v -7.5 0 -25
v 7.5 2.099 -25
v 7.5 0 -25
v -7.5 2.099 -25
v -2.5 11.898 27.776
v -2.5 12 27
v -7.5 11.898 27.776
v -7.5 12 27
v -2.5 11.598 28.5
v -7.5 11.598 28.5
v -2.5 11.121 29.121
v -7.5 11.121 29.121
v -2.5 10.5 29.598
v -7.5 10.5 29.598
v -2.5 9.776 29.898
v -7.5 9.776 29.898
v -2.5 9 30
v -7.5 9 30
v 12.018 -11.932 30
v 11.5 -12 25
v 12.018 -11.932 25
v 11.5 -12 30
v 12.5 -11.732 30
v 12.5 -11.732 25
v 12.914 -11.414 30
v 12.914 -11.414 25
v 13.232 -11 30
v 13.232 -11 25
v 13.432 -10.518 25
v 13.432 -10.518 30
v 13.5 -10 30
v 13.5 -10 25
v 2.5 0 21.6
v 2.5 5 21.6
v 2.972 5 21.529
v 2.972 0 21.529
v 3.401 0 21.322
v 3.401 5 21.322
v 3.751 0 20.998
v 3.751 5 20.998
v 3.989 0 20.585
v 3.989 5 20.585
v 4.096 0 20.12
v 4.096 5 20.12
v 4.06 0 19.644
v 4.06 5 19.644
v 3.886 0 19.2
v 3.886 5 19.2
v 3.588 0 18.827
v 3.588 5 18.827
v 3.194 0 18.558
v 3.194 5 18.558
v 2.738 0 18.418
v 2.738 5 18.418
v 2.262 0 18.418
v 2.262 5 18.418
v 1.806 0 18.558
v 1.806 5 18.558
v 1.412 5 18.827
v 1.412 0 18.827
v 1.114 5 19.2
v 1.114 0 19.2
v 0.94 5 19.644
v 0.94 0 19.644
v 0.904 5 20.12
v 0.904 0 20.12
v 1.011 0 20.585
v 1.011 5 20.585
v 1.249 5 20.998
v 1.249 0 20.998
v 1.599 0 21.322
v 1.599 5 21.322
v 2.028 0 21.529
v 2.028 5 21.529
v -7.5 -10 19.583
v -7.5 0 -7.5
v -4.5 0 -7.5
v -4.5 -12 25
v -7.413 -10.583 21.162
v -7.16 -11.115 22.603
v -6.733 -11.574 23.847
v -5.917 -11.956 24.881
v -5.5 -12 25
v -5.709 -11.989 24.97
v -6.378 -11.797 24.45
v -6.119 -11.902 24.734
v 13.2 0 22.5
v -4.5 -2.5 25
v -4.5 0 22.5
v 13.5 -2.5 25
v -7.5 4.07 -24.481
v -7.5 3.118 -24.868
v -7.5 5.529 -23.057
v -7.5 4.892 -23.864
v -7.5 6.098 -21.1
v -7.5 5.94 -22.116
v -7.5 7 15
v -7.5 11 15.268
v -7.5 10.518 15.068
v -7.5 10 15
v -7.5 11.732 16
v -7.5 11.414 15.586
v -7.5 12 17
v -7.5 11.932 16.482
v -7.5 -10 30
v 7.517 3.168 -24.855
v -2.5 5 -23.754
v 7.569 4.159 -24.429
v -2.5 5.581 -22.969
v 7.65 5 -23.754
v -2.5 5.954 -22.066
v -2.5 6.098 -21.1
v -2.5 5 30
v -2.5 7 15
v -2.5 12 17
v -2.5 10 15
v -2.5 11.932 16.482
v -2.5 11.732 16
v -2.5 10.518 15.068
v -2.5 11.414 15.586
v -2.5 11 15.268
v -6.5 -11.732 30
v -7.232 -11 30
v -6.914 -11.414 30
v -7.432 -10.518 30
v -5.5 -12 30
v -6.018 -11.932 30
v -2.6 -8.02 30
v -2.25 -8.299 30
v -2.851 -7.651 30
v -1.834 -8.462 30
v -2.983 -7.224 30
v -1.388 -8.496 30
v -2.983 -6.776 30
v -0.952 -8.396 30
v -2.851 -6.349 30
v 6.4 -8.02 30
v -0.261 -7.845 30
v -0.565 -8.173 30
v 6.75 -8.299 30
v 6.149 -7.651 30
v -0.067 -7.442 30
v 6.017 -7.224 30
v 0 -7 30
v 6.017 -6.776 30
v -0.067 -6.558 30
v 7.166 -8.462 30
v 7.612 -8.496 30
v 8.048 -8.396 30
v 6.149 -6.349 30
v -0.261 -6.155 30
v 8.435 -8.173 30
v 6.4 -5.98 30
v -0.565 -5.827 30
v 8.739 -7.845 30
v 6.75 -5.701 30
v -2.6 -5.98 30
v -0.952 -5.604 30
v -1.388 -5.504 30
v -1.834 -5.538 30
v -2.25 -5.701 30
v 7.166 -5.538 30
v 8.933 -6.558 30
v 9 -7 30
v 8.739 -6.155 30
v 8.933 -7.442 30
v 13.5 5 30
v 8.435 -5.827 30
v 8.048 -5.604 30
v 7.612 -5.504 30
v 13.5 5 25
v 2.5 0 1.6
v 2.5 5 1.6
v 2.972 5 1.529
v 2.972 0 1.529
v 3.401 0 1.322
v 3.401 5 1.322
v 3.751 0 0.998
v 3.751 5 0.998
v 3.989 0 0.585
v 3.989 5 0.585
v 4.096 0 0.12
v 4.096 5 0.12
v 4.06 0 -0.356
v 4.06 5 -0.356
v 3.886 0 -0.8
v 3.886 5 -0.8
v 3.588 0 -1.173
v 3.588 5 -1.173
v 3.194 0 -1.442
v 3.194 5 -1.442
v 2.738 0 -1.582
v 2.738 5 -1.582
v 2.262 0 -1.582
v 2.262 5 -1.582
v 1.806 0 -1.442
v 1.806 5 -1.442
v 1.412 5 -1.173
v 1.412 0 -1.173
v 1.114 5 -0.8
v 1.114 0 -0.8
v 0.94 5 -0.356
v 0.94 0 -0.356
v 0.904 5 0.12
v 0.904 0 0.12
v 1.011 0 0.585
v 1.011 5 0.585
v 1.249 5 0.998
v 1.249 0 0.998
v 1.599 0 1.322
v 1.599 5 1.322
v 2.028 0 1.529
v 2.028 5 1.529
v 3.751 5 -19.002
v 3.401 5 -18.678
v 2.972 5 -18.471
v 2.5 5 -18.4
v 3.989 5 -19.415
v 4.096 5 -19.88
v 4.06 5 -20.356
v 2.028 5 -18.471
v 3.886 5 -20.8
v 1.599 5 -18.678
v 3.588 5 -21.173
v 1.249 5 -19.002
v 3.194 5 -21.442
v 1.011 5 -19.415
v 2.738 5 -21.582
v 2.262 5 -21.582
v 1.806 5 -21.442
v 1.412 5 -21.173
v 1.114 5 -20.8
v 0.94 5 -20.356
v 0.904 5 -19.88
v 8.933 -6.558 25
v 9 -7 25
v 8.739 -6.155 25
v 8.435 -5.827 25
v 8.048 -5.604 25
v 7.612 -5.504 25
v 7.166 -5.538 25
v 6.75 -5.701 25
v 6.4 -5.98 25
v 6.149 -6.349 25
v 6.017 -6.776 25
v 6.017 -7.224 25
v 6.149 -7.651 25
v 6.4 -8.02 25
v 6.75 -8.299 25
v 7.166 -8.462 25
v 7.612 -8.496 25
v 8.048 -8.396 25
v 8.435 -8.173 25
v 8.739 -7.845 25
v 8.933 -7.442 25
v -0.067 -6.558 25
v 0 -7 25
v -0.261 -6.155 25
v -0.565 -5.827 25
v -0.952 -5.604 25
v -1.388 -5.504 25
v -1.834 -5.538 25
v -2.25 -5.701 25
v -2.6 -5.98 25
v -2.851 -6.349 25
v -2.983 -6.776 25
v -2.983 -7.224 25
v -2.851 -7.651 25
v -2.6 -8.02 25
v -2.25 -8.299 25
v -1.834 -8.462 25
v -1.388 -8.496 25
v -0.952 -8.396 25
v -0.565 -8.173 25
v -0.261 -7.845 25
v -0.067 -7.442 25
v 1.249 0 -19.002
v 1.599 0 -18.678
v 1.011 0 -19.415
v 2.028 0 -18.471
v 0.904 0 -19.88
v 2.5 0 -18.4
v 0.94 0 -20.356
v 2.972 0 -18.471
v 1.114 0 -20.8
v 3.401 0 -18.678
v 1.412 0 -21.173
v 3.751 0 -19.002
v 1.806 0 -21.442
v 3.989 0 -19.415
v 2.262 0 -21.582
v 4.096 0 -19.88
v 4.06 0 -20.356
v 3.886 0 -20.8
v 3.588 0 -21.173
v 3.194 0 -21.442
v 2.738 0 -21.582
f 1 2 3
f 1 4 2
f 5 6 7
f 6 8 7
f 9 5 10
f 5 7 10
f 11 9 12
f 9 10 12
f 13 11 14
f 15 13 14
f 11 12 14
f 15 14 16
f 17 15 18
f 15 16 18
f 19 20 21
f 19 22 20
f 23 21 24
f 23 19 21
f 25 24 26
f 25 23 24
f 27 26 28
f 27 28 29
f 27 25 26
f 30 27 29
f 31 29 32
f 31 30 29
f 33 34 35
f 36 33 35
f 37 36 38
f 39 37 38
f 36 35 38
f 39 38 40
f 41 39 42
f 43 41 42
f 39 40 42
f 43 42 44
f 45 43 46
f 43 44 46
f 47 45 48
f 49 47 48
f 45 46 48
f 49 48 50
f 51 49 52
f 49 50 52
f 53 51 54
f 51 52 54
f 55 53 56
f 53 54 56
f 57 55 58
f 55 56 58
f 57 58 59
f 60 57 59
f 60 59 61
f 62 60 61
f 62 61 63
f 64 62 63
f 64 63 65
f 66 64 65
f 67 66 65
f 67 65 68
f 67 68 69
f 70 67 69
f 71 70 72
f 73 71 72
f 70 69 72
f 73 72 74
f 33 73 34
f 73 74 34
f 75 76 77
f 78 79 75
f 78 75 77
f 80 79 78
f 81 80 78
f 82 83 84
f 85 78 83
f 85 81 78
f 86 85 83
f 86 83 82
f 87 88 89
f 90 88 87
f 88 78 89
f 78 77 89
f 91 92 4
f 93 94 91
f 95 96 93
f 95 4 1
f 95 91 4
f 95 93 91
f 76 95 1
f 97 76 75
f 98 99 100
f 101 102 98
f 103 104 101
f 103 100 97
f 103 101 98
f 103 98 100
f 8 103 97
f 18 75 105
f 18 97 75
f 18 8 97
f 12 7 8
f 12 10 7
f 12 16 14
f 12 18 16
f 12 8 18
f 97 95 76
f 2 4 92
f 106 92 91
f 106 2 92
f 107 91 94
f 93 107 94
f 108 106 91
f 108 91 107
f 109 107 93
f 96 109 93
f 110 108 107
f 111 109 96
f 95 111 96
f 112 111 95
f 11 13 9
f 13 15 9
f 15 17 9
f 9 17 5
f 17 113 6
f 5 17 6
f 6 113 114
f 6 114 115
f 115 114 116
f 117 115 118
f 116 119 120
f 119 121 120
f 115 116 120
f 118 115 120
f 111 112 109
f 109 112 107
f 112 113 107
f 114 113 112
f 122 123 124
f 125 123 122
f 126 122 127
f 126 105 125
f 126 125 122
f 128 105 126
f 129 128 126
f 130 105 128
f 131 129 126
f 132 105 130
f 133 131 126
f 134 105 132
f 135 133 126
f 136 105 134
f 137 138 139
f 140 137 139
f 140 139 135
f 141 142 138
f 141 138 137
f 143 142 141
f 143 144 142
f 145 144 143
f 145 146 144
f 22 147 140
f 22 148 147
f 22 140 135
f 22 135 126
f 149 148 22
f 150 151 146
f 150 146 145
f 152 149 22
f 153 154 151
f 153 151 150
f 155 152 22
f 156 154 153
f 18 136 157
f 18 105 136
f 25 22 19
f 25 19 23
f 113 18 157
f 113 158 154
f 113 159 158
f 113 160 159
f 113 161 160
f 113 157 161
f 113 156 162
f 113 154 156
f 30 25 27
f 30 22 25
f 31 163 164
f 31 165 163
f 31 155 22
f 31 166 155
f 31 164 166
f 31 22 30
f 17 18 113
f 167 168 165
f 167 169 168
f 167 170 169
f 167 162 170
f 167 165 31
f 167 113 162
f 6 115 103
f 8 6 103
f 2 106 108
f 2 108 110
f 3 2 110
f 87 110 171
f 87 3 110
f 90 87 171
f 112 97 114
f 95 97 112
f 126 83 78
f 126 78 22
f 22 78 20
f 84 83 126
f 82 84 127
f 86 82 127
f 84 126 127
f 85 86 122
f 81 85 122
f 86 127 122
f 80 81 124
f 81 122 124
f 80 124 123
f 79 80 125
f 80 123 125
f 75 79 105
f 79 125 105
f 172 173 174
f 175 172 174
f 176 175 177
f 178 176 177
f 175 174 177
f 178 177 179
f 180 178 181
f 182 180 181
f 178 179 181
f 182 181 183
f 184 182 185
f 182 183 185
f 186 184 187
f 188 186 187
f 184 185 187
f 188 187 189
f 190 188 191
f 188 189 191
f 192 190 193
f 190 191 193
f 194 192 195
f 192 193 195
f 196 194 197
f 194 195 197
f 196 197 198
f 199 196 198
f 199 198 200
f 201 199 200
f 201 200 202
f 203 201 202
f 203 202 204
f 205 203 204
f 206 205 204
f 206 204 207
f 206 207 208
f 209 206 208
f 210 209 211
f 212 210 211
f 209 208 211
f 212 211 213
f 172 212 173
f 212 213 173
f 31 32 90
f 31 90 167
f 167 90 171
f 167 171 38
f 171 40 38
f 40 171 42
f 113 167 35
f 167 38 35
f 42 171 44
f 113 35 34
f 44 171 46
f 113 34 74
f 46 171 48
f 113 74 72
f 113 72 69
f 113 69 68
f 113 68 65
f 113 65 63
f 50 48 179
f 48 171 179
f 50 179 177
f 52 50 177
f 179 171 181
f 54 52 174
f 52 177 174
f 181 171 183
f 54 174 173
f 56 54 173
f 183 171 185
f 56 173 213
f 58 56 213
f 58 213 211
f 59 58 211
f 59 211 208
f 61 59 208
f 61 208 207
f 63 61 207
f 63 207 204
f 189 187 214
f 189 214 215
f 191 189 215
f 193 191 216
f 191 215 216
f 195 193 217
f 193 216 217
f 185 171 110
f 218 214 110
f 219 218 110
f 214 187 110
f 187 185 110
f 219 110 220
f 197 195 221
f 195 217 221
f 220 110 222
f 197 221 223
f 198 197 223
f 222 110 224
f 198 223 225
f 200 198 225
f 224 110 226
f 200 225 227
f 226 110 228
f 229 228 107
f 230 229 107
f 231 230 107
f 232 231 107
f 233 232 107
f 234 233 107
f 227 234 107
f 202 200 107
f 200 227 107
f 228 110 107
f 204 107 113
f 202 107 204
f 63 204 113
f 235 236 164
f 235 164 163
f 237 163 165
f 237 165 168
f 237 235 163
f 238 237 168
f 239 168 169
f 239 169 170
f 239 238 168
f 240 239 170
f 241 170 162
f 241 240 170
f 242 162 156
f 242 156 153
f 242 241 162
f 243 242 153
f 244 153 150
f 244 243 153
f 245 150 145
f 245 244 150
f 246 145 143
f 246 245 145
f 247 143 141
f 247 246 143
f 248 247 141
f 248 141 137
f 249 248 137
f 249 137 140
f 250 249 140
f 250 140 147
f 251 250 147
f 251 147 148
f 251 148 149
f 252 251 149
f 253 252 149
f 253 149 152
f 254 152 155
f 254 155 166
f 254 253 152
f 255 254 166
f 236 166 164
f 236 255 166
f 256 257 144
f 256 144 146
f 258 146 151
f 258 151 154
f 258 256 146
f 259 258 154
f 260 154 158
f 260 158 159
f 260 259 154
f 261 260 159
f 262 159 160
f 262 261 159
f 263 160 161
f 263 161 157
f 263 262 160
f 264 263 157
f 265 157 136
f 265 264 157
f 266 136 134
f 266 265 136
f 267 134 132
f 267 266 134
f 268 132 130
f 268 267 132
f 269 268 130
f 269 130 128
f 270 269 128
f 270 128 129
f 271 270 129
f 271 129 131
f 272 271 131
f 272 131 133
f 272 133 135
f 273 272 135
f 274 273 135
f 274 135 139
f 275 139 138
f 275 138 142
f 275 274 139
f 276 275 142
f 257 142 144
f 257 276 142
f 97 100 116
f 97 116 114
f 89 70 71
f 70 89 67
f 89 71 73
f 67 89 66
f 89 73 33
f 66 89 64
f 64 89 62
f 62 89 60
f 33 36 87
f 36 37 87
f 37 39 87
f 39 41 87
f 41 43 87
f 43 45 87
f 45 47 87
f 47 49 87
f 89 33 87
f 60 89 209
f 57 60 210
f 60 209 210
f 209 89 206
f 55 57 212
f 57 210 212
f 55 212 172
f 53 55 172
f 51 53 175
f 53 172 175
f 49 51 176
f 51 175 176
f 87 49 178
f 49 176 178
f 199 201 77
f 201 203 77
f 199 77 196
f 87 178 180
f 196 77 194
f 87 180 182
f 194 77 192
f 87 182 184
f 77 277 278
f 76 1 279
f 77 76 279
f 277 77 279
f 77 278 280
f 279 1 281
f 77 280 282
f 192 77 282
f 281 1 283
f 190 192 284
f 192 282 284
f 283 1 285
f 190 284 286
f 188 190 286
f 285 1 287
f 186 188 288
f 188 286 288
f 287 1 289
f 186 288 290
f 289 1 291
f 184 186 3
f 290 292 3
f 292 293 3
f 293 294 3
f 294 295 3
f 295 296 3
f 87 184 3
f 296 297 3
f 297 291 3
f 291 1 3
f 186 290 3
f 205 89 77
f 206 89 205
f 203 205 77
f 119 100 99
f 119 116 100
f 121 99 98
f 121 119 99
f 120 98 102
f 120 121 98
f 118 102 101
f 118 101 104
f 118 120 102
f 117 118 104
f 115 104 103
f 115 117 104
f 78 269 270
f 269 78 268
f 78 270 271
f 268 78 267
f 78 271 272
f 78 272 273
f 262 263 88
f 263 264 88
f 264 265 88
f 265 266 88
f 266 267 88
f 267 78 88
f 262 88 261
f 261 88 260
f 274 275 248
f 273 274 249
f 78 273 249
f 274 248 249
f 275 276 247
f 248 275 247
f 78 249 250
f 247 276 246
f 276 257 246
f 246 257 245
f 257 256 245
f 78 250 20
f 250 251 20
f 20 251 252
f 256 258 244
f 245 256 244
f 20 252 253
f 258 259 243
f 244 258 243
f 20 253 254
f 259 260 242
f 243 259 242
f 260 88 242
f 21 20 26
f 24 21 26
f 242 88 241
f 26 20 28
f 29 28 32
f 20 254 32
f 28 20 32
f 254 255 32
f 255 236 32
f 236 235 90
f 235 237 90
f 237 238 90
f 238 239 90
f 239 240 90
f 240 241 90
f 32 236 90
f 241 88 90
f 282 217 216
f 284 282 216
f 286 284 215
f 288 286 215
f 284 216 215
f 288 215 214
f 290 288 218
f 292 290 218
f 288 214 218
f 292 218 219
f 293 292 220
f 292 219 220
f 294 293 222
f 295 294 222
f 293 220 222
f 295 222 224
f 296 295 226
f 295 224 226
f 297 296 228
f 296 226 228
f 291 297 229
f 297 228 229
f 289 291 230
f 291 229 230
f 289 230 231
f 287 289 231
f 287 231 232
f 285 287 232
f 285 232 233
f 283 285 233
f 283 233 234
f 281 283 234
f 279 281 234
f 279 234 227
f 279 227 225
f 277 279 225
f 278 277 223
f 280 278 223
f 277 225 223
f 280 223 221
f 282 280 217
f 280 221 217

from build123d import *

# Parameters (mm, degrees)
SKETCH_1_W          = 15
SKETCH_1_H          = 50
EXTRUDE_1_DEPTH     = 5
EXTRUDE_2_DEPTH     = 5
FILLET_1_R          = 4
FILLET_3_R          = 2
SKETCH_5_R          = 1.6
CUT_EXTRUDE_1_DEPTH = 5
SKETCH_7_R          = 1.5
EXTRUDE_3_DEPTH     = 5
CHAMFER_1_SIZE      = 2.5
FILLET_8_R          = 3
EXTRUDE_4_DEPTH     = 3
FILLET_9_R          = 2


with BuildPart() as part:
    # 草图1 → 凸台-拉伸1 (new body)
    with BuildSketch(Plane(origin=(0, 0, 0), x_dir=(1, 0, 0), z_dir=(0, 1, 0))):
        Rectangle(SKETCH_1_W, SKETCH_1_H)
        Polygon((13.5, -25), (7.5, -25), (7.5, 25), align=None)
    extrude(amount=EXTRUDE_1_DEPTH)

    # 草图4 → 凸台-拉伸2 (add)
    with BuildSketch(Plane.ZY.offset(7.5)):
        Polygon((-25, 6), (-25, 5), (25, 5), (25, 12), (15, 12), (15, 7), align=None)
    extrude(amount=-EXTRUDE_2_DEPTH)

    # 圆角1
    fillet_1_edges = [part.edges().sort_by_distance(p)[0] for p in [
        (-5, 6, -25),
    ]]
    fillet(fillet_1_edges, radius=FILLET_1_R)

    # 圆角3
    fillet_3_edges = [part.edges().sort_by_distance(p)[0] for p in [
        (-5, 12, 15),
    ]]
    fillet(fillet_3_edges, radius=FILLET_3_R)

    # 草图5 → 切除-拉伸1 (cut)
    with BuildSketch(Plane(origin=(0, 5, 0), x_dir=(1, 0, 0), z_dir=(0, 1, 0))):
        with Locations(Location((2.5, 20, 0), (0, 0, 270))):
            Circle(SKETCH_5_R)
        with Locations(Location((2.5, 0, 0), (0, 0, 270))):
            Circle(SKETCH_5_R)
        with Locations(Location((2.5, -20, 0), (0, 0, 270))):
            Circle(SKETCH_5_R)
    extrude(amount=-CUT_EXTRUDE_1_DEPTH, mode=Mode.SUBTRACT)

    # 草图7 → 凸台-拉伸3 (add)
    with BuildSketch(Plane.XY.offset(25)):
        Polygon((13.5, 0), (13.5, 5), (-2.5, 5), (-2.5, 12), (-7.5, 12), (-7.5, 0), (-7.5, -12), (13.5, -12), align=None)
        with Locations((-1.5, -7)):
            Circle(SKETCH_7_R, mode=Mode.SUBTRACT)
        with Locations((7.5, -7)):
            Circle(SKETCH_7_R, mode=Mode.SUBTRACT)
    extrude(amount=EXTRUDE_3_DEPTH)

    # 倒角1
    chamfer_1_edges = [part.edges().sort_by_distance(p)[0] for p in [
        (3, 0, 25),
    ]]
    chamfer(chamfer_1_edges, length=CHAMFER_1_SIZE)

    # 圆角8
    fillet_8_edges = [part.edges().sort_by_distance(p)[0] for p in [
        (-5, 12, 30),
    ]]
    fillet(fillet_8_edges, radius=FILLET_8_R)

    # 草图8 → 凸台-拉伸4 (add)
    with BuildSketch(Plane.ZY.offset(7.5)):
        Polygon((25, -12), (25, -2.5), (22.5, 0), (-7.5, 0), align=None)
    extrude(amount=-EXTRUDE_4_DEPTH)

    # 圆角9
    fillet_9_edges = [part.edges().sort_by_distance(p)[0] for p in [
        (13.5, -12, 27.5),
        (-7.5, -12, 27.5),
    ]]
    fillet(fillet_9_edges, radius=FILLET_9_R)


solid = part.part
